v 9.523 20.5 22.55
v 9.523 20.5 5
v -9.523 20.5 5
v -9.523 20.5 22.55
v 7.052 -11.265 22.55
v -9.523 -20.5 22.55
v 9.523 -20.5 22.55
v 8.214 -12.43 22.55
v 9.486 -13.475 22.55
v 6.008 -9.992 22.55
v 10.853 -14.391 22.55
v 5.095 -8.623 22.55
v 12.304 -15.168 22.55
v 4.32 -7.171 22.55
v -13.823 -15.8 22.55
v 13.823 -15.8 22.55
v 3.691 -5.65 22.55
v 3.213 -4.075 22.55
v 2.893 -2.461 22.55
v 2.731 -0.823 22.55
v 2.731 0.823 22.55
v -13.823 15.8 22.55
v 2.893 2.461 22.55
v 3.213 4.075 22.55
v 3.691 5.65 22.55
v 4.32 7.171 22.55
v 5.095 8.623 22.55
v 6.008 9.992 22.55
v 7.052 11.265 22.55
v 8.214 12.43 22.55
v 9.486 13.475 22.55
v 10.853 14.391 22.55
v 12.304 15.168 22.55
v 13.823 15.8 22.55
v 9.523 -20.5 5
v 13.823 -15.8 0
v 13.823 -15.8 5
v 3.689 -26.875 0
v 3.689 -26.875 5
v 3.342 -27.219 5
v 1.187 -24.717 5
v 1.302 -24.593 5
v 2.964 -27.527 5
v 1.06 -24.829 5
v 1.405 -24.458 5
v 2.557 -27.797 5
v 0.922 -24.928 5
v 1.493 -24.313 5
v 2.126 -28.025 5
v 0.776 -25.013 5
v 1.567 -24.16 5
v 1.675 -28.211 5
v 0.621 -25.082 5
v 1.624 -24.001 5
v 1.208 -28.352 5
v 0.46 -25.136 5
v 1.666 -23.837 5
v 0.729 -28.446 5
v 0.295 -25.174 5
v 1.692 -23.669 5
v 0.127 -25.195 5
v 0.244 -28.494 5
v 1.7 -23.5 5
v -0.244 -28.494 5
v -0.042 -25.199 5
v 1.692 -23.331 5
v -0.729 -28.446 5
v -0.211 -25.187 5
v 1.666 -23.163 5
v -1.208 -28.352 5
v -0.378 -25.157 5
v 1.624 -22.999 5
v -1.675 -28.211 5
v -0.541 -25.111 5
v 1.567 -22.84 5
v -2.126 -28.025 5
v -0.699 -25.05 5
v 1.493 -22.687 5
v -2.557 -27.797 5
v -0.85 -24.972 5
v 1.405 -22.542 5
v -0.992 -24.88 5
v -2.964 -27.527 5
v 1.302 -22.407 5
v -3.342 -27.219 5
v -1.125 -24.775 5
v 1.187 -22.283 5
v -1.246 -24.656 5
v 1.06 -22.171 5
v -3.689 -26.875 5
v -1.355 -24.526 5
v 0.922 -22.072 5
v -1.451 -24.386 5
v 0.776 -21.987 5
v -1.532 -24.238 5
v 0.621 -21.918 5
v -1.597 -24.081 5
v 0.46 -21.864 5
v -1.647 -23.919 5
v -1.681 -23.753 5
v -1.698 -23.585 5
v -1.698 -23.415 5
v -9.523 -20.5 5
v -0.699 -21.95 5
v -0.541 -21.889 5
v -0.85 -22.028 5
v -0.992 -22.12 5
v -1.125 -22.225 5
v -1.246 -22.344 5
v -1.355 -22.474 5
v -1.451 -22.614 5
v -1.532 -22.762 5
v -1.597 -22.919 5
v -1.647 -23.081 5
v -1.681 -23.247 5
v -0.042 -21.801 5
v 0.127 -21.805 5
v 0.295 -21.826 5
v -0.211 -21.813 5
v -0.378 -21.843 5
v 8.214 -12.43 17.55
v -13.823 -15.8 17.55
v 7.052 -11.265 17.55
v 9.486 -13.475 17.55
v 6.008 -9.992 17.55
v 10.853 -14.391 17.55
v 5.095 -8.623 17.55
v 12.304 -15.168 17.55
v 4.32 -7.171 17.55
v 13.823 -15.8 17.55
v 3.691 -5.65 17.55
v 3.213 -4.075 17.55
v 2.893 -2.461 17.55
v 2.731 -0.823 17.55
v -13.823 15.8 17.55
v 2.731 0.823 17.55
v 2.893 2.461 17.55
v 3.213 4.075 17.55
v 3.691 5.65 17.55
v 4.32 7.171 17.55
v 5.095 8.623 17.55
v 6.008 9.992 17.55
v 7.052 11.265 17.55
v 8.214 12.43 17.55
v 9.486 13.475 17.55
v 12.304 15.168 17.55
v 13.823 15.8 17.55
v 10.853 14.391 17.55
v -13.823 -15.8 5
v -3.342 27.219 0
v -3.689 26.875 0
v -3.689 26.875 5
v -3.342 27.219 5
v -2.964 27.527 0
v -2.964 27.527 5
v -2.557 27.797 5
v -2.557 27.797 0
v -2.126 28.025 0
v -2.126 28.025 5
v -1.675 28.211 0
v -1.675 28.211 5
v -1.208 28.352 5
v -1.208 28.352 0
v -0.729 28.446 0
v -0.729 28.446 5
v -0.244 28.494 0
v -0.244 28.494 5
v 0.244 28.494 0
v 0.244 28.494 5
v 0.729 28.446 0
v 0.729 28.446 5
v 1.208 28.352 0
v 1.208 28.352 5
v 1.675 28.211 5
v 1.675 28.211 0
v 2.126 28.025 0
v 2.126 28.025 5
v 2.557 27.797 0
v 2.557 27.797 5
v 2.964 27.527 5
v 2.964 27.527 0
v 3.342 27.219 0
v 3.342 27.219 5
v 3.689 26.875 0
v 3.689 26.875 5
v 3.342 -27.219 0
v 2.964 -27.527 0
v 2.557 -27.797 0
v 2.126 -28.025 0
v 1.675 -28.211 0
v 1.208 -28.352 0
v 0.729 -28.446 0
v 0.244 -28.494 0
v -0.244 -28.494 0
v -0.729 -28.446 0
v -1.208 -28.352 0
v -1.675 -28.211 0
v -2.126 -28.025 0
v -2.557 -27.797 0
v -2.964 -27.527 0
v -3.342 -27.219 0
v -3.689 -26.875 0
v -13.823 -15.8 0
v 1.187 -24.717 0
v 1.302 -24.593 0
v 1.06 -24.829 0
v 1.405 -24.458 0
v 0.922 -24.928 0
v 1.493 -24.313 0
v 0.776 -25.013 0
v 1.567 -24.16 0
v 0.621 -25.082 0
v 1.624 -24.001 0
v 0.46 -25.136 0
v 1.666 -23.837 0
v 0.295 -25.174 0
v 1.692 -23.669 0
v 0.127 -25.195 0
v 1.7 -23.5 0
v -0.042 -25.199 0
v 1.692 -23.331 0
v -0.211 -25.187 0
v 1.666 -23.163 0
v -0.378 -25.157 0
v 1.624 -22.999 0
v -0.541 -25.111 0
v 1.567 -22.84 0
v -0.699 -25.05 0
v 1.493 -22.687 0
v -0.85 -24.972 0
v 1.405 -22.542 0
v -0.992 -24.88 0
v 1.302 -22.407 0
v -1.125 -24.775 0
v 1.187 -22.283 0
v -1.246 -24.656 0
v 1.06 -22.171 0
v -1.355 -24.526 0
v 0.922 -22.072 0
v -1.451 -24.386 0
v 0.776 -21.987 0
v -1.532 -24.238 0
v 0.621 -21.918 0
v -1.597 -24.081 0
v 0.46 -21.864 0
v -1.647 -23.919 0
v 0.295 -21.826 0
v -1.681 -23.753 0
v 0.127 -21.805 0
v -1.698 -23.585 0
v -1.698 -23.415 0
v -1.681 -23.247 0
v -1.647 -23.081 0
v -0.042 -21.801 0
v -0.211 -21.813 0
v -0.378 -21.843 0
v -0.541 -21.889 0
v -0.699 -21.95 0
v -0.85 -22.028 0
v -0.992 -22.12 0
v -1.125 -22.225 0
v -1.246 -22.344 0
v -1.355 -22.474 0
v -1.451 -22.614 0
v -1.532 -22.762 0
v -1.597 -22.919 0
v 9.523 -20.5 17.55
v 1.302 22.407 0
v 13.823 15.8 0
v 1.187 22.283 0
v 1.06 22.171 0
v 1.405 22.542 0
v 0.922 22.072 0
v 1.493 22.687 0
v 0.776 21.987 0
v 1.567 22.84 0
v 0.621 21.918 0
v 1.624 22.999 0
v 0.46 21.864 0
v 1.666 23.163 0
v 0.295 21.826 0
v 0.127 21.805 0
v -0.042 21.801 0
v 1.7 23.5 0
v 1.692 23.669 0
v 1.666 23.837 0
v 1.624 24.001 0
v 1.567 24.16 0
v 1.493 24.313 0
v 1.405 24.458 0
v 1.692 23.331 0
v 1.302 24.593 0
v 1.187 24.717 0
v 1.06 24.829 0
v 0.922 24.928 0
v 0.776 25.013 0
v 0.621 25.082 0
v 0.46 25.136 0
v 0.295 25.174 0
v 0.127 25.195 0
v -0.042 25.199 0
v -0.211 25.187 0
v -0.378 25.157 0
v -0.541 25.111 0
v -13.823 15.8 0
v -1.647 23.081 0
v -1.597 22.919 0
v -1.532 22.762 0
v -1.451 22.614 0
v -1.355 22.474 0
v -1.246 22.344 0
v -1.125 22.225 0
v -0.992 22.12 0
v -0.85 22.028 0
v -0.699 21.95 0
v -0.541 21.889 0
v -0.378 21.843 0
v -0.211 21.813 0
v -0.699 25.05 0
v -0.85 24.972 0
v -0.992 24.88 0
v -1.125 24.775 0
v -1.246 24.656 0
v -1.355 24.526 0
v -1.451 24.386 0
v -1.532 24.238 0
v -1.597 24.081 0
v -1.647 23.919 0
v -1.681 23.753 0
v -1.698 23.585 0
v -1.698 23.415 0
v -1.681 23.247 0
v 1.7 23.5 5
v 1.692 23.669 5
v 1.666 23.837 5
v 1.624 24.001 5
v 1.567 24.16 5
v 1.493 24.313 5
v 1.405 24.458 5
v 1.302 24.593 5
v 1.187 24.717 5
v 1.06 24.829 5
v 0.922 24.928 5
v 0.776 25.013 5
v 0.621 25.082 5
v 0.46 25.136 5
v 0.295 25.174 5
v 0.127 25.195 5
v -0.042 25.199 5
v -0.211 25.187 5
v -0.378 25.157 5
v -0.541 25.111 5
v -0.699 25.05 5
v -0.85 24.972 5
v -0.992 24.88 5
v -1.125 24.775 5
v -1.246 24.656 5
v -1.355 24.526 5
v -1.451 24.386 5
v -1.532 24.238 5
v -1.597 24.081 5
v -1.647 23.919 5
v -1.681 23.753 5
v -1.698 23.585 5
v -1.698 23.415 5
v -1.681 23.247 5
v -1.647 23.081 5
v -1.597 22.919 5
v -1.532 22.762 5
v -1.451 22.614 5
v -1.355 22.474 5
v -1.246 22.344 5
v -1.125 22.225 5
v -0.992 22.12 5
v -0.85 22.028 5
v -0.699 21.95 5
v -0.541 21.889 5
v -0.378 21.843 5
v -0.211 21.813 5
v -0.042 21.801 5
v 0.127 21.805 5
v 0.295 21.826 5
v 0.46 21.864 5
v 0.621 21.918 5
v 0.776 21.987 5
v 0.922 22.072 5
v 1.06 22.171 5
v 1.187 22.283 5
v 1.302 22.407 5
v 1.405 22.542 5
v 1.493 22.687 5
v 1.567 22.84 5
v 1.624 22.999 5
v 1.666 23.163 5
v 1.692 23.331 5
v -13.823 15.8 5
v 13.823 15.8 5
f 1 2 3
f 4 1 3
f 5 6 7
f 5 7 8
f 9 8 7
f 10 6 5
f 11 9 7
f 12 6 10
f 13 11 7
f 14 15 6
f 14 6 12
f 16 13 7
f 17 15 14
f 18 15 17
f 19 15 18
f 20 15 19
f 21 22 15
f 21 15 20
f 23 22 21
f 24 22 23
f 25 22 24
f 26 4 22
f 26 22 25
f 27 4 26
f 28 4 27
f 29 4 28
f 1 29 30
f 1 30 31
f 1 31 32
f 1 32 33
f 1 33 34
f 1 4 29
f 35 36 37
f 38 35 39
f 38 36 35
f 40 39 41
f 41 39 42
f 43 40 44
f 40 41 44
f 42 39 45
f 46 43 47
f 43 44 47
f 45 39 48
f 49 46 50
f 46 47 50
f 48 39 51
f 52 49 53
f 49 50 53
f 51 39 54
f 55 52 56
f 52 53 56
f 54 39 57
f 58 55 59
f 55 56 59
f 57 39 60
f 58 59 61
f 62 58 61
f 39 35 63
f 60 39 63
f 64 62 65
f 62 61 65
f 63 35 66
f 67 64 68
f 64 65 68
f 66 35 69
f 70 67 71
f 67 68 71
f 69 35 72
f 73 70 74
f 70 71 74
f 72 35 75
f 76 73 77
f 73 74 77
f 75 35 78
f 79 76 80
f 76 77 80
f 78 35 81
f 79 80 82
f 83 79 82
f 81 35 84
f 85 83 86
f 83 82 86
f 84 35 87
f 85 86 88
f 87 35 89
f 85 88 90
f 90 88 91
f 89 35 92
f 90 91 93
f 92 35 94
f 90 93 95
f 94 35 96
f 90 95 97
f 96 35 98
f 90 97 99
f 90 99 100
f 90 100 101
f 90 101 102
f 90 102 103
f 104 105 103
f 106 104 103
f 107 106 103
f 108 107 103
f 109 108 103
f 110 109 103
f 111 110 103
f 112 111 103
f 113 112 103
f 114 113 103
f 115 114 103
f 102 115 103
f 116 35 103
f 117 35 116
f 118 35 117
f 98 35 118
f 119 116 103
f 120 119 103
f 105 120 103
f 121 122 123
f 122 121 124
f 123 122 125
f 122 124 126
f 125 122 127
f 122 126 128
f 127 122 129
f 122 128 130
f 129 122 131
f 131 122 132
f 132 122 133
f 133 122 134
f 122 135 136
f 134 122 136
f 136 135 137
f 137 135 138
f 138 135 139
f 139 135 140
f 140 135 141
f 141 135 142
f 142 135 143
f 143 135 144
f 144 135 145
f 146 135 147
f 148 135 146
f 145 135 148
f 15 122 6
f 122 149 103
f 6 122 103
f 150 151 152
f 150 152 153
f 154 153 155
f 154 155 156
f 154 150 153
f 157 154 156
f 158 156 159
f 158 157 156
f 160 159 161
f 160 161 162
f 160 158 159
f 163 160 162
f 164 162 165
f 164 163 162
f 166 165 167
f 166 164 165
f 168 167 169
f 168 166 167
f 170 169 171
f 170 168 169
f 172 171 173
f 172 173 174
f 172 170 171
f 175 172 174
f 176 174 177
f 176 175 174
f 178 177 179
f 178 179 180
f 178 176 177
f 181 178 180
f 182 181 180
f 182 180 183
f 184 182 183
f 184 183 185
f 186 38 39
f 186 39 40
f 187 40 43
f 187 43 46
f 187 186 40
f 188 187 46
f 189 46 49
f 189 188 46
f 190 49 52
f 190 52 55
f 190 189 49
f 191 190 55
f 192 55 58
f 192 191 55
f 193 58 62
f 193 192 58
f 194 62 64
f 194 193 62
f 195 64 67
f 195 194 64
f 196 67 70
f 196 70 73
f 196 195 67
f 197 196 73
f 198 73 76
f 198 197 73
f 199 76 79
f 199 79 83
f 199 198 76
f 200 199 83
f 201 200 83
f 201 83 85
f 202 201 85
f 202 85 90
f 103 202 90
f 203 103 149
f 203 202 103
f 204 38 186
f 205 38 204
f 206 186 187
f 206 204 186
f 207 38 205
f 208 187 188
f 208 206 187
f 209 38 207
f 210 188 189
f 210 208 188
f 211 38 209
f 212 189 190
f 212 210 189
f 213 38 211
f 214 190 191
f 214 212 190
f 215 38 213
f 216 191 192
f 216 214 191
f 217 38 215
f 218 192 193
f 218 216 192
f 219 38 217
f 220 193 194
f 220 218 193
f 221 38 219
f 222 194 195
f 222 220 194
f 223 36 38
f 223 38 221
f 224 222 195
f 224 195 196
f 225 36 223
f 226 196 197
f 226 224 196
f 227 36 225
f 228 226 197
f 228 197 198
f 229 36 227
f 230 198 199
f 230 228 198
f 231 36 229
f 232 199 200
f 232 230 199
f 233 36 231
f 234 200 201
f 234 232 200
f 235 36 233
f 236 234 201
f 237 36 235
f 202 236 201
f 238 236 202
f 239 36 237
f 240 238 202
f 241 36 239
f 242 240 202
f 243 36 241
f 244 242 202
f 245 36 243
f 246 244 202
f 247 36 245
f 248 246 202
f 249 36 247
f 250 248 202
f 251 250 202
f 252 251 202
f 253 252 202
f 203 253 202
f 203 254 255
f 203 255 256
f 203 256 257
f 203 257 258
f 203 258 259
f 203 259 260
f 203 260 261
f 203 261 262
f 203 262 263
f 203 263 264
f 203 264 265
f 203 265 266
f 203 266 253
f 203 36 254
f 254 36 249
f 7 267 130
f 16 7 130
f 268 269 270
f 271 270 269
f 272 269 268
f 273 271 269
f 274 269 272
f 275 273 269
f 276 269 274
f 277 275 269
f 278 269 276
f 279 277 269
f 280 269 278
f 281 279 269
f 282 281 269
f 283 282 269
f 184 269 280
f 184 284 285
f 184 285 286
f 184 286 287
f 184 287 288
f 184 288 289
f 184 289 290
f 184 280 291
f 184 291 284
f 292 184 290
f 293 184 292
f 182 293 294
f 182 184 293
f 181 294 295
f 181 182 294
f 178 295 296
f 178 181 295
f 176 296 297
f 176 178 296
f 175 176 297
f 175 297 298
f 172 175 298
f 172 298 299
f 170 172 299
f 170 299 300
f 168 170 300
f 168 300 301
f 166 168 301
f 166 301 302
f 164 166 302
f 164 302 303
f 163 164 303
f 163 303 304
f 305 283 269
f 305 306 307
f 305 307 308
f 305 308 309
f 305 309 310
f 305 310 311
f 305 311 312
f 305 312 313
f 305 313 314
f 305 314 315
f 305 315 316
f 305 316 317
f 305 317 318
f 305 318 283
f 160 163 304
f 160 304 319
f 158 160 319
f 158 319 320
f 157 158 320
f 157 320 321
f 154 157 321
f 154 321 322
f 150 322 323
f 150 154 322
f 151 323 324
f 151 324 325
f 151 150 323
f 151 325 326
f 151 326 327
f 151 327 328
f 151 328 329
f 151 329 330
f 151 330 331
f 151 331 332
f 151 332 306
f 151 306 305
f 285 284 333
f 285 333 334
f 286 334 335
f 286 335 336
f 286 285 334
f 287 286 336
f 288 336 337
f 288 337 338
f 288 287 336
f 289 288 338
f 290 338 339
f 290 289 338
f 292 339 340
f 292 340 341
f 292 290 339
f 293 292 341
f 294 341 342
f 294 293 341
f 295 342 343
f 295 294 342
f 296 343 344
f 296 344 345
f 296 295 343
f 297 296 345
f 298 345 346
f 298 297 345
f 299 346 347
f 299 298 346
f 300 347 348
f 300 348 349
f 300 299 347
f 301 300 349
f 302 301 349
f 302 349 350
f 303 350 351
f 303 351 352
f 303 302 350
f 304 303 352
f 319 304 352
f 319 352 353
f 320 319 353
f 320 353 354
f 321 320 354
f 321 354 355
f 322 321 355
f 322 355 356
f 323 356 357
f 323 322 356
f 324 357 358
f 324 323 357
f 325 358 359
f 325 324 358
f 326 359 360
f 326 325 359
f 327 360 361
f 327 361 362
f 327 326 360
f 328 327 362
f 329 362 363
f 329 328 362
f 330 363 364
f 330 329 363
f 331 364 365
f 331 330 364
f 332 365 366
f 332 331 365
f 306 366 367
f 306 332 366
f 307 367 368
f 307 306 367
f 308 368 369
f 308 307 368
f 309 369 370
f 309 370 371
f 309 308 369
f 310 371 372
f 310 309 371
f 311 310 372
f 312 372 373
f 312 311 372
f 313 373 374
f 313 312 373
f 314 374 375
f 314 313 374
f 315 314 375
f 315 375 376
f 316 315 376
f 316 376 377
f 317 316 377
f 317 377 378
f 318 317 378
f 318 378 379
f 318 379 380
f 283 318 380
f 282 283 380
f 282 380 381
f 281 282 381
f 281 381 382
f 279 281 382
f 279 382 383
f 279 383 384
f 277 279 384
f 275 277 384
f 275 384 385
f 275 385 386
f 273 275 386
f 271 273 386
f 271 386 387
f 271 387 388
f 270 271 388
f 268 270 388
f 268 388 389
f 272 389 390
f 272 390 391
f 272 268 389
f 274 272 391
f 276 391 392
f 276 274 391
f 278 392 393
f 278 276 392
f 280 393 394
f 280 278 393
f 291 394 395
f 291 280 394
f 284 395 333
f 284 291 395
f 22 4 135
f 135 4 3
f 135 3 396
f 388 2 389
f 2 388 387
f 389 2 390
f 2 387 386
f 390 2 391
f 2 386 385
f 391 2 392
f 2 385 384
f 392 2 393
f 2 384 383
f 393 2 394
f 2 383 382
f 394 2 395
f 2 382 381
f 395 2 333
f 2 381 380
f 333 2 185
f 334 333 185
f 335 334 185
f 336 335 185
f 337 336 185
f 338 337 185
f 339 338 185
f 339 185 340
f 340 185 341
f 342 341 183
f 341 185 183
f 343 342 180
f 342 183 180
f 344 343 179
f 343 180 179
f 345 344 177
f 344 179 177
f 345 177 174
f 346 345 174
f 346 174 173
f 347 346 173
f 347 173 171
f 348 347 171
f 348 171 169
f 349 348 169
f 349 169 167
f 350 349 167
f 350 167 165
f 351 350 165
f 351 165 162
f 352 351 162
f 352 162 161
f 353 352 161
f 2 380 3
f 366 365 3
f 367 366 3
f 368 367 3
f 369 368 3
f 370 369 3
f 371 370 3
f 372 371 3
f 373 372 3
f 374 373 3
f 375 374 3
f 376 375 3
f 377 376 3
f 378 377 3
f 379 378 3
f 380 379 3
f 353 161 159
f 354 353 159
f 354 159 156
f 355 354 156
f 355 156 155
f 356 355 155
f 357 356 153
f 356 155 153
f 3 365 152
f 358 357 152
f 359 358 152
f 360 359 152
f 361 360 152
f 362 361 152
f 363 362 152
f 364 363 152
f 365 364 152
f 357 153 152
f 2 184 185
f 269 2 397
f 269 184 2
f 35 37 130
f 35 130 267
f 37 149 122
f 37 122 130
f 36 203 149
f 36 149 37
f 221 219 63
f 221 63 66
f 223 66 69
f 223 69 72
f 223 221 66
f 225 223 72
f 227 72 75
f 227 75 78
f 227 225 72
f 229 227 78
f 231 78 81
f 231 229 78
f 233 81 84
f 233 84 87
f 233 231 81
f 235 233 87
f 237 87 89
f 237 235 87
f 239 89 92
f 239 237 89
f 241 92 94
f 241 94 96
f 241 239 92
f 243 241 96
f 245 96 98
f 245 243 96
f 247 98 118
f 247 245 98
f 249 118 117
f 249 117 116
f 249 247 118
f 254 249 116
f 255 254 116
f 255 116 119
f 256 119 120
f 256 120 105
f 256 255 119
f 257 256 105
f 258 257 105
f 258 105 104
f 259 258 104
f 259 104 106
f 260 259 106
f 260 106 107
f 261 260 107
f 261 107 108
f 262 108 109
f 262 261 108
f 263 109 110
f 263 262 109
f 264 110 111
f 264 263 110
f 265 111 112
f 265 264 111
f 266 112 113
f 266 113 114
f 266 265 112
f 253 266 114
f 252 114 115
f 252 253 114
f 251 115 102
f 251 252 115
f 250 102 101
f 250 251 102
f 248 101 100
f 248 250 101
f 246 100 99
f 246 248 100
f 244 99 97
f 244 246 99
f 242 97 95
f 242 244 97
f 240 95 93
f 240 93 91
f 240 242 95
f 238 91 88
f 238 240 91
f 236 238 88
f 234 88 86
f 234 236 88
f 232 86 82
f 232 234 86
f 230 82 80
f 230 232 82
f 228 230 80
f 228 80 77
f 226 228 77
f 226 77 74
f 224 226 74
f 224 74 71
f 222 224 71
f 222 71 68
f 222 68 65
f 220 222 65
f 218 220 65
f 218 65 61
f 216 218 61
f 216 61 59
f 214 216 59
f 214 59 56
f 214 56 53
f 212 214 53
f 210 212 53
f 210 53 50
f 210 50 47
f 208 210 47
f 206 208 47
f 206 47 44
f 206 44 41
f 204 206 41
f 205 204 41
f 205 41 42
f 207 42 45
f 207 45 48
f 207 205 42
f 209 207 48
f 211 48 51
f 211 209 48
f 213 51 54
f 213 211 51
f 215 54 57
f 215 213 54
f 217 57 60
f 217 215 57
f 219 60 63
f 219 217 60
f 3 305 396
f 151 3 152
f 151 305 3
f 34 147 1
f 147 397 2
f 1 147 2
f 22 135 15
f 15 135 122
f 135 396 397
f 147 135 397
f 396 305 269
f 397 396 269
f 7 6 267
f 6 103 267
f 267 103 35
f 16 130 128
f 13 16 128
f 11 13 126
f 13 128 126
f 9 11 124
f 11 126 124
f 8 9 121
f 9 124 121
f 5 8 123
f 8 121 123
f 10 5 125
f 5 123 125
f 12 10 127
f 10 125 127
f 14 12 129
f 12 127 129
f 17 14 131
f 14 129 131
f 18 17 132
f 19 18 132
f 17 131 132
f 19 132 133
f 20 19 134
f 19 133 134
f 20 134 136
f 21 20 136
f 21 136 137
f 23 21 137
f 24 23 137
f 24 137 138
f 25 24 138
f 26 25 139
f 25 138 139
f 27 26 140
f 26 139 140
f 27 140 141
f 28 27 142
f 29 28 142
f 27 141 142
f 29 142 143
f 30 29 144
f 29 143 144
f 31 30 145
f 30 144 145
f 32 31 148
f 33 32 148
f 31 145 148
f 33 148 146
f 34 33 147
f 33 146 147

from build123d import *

# Parameters (mm, degrees)
SKETCH1_R             = 1.7
BOSS_EXTRUDE1_DEPTH   = 5
BOSS_EXTRUDE1_2_DEPTH = 5
BOSS_EXTRUDE2_DEPTH   = 12.55
BOSS_EXTRUDE3_DEPTH   = 5


with BuildPart() as part:
    # Sketch1 → Boss-Extrude1 (new body)
    with BuildSketch(Plane.XY):
        with BuildLine():
            Line((3.688712639, 26.875410947), (13.823430903, 15.8))
            Line((13.823430903, 15.8), (-13.823430903, 15.8))
            Line((-13.823430903, 15.8), (-3.688712639, 26.875410947))
            ThreePointArc((-3.688712639, 26.875410947), (0, 28.5), (3.688712639, 26.875410947))
        make_face()
        with Locations((0, 23.5)):
            Circle(SKETCH1_R, mode=Mode.SUBTRACT)
    extrude(amount=BOSS_EXTRUDE1_DEPTH)



with BuildPart() as body_2:
    # Sketch1 → Boss-Extrude1 2 (new body)
    with BuildSketch(Plane.XY):
        with BuildLine():
            ThreePointArc((3.688712639, -26.875410947), (0, -28.5), (-3.688712639, -26.875410947))
            Line((-3.688712639, -26.875410947), (-13.823430903, -15.8))
            Line((-13.823430903, -15.8), (13.823430903, -15.8))
            Line((13.823430903, -15.8), (3.688712639, -26.875410947))
        make_face()
        with Locations((0, -23.5)):
            Circle(SKETCH1_R, mode=Mode.SUBTRACT)
    extrude(amount=BOSS_EXTRUDE1_2_DEPTH)


with BuildPart() as part_1:
    add(part.part)

    add(body_2.part)  # Boss-Extrude2 merges body 2
    # Sketch2 → Boss-Extrude2 (add)
    with BuildSketch(Plane.XY.offset(5)):
        Polygon((-13.823430903, -15.8), (13.823430903, -15.8), (9.52262653, -20.5), (-9.52262653, -20.5), align=None)
        Polygon((-9.52262653, 20.5), (-13.823430903, 15.8), (13.823430903, 15.8), (9.52262653, 20.5), align=None)
    extrude(amount=BOSS_EXTRUDE2_DEPTH)

    # Sketch3 → Boss-Extrude3 (add)
    with BuildSketch(Plane.XY.offset(17.55)):
        with BuildLine():
            Line((-13.823430903, 15.8), (-13.823430903, -15.8))
            Line((-13.823430903, -15.8), (-9.52262653, -20.5))
            Line((-9.52262653, -20.5), (9.52262653, -20.5))
            Line((9.52262653, -20.5), (13.823430905, -15.8))
            ThreePointArc((13.823430905, -15.8), (2.711210982, -1e-09), (13.823430903, 15.8))
            Line((13.823430903, 15.8), (9.52262653, 20.5))
            Line((9.52262653, 20.5), (-9.52262653, 20.5))
            Line((-9.52262653, 20.5), (-13.823430903, 15.8))
        make_face()
    extrude(amount=BOSS_EXTRUDE3_DEPTH)


solid = part_1.part
